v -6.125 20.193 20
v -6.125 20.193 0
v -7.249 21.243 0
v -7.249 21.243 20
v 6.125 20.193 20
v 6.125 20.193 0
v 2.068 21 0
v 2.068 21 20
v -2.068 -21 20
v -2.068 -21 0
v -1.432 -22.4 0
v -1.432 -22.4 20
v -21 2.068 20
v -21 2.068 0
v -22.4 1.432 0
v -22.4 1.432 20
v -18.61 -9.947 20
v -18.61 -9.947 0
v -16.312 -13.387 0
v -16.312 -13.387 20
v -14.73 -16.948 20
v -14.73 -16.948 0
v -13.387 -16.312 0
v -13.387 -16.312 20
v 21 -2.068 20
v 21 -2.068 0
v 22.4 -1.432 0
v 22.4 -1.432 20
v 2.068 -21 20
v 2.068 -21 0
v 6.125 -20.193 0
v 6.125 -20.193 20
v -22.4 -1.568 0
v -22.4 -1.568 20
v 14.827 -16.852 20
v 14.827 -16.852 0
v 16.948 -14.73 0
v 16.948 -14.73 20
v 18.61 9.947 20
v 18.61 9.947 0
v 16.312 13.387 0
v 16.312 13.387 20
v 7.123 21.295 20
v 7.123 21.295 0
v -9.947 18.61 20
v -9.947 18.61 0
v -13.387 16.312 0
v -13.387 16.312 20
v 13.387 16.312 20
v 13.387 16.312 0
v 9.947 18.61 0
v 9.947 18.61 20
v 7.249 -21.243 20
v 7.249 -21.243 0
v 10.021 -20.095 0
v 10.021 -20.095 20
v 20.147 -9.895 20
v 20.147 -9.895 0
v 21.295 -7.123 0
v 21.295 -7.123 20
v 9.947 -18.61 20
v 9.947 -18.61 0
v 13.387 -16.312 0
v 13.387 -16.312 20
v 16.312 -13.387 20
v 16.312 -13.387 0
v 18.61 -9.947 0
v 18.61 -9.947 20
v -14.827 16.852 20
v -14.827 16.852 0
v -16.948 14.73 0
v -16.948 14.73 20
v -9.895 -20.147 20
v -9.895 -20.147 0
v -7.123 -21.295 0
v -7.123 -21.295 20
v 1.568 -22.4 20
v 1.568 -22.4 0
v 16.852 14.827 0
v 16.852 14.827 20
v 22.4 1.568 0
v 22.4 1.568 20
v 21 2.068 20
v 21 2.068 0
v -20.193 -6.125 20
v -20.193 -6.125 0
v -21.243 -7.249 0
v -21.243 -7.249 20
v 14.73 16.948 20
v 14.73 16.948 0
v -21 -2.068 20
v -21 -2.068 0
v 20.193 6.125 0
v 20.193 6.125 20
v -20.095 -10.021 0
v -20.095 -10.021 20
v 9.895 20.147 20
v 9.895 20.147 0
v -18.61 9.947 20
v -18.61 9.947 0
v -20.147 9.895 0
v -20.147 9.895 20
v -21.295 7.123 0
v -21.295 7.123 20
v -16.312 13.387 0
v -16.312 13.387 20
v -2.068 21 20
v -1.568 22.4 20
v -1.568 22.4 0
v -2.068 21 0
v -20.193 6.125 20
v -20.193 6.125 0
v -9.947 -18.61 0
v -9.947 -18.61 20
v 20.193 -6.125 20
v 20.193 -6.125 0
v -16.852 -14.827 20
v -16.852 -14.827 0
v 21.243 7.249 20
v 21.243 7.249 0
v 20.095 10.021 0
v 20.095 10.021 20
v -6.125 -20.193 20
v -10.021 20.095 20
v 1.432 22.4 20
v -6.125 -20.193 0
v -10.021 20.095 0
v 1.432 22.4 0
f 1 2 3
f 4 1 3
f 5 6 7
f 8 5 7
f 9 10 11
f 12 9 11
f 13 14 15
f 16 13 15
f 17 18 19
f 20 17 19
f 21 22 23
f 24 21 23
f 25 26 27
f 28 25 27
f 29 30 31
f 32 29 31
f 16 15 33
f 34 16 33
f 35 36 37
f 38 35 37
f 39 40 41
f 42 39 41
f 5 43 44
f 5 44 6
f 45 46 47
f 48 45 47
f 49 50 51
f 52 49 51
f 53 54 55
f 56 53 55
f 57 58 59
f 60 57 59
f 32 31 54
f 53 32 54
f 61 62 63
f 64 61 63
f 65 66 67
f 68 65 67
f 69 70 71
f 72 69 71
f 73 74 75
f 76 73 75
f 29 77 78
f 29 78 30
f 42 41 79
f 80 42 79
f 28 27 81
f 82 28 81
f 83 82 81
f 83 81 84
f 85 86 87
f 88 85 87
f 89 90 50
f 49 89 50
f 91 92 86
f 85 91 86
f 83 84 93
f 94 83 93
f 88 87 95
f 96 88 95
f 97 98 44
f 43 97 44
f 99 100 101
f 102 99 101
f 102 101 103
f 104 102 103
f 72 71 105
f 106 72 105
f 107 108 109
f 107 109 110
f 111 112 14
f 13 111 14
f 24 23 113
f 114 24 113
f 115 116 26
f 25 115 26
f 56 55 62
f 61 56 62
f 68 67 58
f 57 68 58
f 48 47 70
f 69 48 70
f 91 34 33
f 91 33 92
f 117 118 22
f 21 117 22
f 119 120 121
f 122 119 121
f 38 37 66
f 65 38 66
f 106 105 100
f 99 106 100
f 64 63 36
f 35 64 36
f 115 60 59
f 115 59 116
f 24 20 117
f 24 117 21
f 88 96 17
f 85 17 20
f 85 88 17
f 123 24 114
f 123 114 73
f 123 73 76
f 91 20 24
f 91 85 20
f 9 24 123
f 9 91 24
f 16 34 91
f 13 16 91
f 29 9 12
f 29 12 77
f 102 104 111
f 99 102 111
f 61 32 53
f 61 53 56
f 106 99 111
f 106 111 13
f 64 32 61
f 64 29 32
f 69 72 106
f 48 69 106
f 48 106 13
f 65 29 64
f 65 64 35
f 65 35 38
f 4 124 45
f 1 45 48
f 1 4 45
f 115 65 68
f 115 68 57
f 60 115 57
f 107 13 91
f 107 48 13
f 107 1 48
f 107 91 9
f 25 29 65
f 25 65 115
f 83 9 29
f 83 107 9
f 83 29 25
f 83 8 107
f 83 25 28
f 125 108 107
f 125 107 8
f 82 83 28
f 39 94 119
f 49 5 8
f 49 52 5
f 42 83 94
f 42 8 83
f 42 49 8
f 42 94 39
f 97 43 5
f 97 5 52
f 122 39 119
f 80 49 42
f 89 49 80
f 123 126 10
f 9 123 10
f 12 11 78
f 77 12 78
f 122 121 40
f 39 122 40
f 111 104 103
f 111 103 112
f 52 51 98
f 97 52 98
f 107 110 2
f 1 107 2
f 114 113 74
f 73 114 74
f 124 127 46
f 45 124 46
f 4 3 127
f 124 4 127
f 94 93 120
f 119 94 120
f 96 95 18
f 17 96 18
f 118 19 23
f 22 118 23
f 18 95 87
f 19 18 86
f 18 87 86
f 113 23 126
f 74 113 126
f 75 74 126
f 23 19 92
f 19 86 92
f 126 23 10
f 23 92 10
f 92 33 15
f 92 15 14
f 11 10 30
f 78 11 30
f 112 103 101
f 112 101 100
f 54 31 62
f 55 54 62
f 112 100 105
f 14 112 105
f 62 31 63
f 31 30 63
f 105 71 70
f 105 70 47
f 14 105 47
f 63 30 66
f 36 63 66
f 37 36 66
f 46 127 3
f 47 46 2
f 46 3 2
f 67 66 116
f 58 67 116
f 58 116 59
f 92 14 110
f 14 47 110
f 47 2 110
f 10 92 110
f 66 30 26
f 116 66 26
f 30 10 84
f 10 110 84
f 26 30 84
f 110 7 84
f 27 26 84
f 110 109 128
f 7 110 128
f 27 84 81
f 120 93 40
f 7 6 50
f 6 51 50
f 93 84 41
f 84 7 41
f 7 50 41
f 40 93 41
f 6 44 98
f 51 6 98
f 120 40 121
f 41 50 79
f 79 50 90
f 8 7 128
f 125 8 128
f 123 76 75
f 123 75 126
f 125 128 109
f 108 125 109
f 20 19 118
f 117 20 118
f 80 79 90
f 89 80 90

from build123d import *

# Parameters (mm, degrees)
F1_DEPTH = 20


with BuildPart() as f1:
    # F0 (on Top) → F1 (new body)
    with BuildSketch(Plane.XY):
        Polygon((22.4, 1.568319), (21, 2.068319), (21, -2.068319), (22.4, -1.431681), align=None)
        Polygon((21, -2.068319), (21, 2.068319), (20.192982, 6.125474), (18.609959, 9.94723), (16.311765, 13.38672), (13.38672, 16.311765), (9.94723, 18.609959), (6.125474, 20.192982), (2.068319, 21), (-2.068319, 21), (-6.125474, 20.192982), (-9.94723, 18.609959), (-13.38672, 16.311765), (-16.311765, 13.38672), (-18.609959, 9.94723), (-20.192982, 6.125474), (-21, 2.068319), (-21, -2.068319), (-20.192982, -6.125474), (-18.609959, -9.94723), (-16.311765, -13.38672), (-13.38672, -16.311765), (-9.94723, -18.609959), (-6.125474, -20.192982), (-2.068319, -21), (2.068319, -21), (6.125474, -20.192982), (9.94723, -18.609959), (13.38672, -16.311765), (16.311765, -13.38672), (18.609959, -9.94723), (20.192982, -6.125474), align=None)
        Polygon((18.609959, 9.94723), (20.192982, 6.125474), (21.242782, 7.249409), (20.094732, 10.021047), align=None)
        Polygon((21.295071, -7.123171), (20.192982, -6.125474), (18.609959, -9.94723), (20.147021, -9.894809), align=None)
        Polygon((13.38672, 16.311765), (16.311765, 13.38672), (16.851543, 14.826841), (14.730223, 16.948161), align=None)
        Polygon((16.948161, -14.730223), (16.311765, -13.38672), (13.38672, -16.311765), (14.826841, -16.851543), align=None)
        Polygon((6.125474, 20.192982), (9.94723, 18.609959), (9.894809, 20.147021), (7.123171, 21.295071), align=None)
        Polygon((10.021047, -20.094732), (9.94723, -18.609959), (6.125474, -20.192982), (7.249409, -21.242782), align=None)
        Polygon((-2.068319, 21), (2.068319, 21), (1.431681, 22.4), (-1.568319, 22.4), align=None)
        Polygon((1.568319, -22.4), (2.068319, -21), (-2.068319, -21), (-1.431681, -22.4), align=None)
        Polygon((-9.94723, 18.609959), (-6.125474, 20.192982), (-7.249408, 21.242782), (-10.021047, 20.094732), align=None)
        Polygon((-7.123171, -21.295071), (-6.125474, -20.192982), (-9.94723, -18.609959), (-9.894809, -20.147021), align=None)
        Polygon((-16.311765, 13.38672), (-13.38672, 16.311765), (-14.826841, 16.851543), (-16.948161, 14.730223), align=None)
        Polygon((-14.730223, -16.948161), (-13.38672, -16.311765), (-16.311765, -13.38672), (-16.851543, -14.826841), align=None)
        Polygon((-20.192982, 6.125474), (-18.609959, 9.94723), (-20.147021, 9.894809), (-21.295071, 7.123171), align=None)
        Polygon((-20.094732, -10.021047), (-18.609959, -9.94723), (-20.192982, -6.125474), (-21.242782, -7.249408), align=None)
        Polygon((-21, -2.068319), (-21, 2.068319), (-22.4, 1.431681), (-22.4, -1.568319), align=None)
    extrude(amount=F1_DEPTH)


solid = f1.part
